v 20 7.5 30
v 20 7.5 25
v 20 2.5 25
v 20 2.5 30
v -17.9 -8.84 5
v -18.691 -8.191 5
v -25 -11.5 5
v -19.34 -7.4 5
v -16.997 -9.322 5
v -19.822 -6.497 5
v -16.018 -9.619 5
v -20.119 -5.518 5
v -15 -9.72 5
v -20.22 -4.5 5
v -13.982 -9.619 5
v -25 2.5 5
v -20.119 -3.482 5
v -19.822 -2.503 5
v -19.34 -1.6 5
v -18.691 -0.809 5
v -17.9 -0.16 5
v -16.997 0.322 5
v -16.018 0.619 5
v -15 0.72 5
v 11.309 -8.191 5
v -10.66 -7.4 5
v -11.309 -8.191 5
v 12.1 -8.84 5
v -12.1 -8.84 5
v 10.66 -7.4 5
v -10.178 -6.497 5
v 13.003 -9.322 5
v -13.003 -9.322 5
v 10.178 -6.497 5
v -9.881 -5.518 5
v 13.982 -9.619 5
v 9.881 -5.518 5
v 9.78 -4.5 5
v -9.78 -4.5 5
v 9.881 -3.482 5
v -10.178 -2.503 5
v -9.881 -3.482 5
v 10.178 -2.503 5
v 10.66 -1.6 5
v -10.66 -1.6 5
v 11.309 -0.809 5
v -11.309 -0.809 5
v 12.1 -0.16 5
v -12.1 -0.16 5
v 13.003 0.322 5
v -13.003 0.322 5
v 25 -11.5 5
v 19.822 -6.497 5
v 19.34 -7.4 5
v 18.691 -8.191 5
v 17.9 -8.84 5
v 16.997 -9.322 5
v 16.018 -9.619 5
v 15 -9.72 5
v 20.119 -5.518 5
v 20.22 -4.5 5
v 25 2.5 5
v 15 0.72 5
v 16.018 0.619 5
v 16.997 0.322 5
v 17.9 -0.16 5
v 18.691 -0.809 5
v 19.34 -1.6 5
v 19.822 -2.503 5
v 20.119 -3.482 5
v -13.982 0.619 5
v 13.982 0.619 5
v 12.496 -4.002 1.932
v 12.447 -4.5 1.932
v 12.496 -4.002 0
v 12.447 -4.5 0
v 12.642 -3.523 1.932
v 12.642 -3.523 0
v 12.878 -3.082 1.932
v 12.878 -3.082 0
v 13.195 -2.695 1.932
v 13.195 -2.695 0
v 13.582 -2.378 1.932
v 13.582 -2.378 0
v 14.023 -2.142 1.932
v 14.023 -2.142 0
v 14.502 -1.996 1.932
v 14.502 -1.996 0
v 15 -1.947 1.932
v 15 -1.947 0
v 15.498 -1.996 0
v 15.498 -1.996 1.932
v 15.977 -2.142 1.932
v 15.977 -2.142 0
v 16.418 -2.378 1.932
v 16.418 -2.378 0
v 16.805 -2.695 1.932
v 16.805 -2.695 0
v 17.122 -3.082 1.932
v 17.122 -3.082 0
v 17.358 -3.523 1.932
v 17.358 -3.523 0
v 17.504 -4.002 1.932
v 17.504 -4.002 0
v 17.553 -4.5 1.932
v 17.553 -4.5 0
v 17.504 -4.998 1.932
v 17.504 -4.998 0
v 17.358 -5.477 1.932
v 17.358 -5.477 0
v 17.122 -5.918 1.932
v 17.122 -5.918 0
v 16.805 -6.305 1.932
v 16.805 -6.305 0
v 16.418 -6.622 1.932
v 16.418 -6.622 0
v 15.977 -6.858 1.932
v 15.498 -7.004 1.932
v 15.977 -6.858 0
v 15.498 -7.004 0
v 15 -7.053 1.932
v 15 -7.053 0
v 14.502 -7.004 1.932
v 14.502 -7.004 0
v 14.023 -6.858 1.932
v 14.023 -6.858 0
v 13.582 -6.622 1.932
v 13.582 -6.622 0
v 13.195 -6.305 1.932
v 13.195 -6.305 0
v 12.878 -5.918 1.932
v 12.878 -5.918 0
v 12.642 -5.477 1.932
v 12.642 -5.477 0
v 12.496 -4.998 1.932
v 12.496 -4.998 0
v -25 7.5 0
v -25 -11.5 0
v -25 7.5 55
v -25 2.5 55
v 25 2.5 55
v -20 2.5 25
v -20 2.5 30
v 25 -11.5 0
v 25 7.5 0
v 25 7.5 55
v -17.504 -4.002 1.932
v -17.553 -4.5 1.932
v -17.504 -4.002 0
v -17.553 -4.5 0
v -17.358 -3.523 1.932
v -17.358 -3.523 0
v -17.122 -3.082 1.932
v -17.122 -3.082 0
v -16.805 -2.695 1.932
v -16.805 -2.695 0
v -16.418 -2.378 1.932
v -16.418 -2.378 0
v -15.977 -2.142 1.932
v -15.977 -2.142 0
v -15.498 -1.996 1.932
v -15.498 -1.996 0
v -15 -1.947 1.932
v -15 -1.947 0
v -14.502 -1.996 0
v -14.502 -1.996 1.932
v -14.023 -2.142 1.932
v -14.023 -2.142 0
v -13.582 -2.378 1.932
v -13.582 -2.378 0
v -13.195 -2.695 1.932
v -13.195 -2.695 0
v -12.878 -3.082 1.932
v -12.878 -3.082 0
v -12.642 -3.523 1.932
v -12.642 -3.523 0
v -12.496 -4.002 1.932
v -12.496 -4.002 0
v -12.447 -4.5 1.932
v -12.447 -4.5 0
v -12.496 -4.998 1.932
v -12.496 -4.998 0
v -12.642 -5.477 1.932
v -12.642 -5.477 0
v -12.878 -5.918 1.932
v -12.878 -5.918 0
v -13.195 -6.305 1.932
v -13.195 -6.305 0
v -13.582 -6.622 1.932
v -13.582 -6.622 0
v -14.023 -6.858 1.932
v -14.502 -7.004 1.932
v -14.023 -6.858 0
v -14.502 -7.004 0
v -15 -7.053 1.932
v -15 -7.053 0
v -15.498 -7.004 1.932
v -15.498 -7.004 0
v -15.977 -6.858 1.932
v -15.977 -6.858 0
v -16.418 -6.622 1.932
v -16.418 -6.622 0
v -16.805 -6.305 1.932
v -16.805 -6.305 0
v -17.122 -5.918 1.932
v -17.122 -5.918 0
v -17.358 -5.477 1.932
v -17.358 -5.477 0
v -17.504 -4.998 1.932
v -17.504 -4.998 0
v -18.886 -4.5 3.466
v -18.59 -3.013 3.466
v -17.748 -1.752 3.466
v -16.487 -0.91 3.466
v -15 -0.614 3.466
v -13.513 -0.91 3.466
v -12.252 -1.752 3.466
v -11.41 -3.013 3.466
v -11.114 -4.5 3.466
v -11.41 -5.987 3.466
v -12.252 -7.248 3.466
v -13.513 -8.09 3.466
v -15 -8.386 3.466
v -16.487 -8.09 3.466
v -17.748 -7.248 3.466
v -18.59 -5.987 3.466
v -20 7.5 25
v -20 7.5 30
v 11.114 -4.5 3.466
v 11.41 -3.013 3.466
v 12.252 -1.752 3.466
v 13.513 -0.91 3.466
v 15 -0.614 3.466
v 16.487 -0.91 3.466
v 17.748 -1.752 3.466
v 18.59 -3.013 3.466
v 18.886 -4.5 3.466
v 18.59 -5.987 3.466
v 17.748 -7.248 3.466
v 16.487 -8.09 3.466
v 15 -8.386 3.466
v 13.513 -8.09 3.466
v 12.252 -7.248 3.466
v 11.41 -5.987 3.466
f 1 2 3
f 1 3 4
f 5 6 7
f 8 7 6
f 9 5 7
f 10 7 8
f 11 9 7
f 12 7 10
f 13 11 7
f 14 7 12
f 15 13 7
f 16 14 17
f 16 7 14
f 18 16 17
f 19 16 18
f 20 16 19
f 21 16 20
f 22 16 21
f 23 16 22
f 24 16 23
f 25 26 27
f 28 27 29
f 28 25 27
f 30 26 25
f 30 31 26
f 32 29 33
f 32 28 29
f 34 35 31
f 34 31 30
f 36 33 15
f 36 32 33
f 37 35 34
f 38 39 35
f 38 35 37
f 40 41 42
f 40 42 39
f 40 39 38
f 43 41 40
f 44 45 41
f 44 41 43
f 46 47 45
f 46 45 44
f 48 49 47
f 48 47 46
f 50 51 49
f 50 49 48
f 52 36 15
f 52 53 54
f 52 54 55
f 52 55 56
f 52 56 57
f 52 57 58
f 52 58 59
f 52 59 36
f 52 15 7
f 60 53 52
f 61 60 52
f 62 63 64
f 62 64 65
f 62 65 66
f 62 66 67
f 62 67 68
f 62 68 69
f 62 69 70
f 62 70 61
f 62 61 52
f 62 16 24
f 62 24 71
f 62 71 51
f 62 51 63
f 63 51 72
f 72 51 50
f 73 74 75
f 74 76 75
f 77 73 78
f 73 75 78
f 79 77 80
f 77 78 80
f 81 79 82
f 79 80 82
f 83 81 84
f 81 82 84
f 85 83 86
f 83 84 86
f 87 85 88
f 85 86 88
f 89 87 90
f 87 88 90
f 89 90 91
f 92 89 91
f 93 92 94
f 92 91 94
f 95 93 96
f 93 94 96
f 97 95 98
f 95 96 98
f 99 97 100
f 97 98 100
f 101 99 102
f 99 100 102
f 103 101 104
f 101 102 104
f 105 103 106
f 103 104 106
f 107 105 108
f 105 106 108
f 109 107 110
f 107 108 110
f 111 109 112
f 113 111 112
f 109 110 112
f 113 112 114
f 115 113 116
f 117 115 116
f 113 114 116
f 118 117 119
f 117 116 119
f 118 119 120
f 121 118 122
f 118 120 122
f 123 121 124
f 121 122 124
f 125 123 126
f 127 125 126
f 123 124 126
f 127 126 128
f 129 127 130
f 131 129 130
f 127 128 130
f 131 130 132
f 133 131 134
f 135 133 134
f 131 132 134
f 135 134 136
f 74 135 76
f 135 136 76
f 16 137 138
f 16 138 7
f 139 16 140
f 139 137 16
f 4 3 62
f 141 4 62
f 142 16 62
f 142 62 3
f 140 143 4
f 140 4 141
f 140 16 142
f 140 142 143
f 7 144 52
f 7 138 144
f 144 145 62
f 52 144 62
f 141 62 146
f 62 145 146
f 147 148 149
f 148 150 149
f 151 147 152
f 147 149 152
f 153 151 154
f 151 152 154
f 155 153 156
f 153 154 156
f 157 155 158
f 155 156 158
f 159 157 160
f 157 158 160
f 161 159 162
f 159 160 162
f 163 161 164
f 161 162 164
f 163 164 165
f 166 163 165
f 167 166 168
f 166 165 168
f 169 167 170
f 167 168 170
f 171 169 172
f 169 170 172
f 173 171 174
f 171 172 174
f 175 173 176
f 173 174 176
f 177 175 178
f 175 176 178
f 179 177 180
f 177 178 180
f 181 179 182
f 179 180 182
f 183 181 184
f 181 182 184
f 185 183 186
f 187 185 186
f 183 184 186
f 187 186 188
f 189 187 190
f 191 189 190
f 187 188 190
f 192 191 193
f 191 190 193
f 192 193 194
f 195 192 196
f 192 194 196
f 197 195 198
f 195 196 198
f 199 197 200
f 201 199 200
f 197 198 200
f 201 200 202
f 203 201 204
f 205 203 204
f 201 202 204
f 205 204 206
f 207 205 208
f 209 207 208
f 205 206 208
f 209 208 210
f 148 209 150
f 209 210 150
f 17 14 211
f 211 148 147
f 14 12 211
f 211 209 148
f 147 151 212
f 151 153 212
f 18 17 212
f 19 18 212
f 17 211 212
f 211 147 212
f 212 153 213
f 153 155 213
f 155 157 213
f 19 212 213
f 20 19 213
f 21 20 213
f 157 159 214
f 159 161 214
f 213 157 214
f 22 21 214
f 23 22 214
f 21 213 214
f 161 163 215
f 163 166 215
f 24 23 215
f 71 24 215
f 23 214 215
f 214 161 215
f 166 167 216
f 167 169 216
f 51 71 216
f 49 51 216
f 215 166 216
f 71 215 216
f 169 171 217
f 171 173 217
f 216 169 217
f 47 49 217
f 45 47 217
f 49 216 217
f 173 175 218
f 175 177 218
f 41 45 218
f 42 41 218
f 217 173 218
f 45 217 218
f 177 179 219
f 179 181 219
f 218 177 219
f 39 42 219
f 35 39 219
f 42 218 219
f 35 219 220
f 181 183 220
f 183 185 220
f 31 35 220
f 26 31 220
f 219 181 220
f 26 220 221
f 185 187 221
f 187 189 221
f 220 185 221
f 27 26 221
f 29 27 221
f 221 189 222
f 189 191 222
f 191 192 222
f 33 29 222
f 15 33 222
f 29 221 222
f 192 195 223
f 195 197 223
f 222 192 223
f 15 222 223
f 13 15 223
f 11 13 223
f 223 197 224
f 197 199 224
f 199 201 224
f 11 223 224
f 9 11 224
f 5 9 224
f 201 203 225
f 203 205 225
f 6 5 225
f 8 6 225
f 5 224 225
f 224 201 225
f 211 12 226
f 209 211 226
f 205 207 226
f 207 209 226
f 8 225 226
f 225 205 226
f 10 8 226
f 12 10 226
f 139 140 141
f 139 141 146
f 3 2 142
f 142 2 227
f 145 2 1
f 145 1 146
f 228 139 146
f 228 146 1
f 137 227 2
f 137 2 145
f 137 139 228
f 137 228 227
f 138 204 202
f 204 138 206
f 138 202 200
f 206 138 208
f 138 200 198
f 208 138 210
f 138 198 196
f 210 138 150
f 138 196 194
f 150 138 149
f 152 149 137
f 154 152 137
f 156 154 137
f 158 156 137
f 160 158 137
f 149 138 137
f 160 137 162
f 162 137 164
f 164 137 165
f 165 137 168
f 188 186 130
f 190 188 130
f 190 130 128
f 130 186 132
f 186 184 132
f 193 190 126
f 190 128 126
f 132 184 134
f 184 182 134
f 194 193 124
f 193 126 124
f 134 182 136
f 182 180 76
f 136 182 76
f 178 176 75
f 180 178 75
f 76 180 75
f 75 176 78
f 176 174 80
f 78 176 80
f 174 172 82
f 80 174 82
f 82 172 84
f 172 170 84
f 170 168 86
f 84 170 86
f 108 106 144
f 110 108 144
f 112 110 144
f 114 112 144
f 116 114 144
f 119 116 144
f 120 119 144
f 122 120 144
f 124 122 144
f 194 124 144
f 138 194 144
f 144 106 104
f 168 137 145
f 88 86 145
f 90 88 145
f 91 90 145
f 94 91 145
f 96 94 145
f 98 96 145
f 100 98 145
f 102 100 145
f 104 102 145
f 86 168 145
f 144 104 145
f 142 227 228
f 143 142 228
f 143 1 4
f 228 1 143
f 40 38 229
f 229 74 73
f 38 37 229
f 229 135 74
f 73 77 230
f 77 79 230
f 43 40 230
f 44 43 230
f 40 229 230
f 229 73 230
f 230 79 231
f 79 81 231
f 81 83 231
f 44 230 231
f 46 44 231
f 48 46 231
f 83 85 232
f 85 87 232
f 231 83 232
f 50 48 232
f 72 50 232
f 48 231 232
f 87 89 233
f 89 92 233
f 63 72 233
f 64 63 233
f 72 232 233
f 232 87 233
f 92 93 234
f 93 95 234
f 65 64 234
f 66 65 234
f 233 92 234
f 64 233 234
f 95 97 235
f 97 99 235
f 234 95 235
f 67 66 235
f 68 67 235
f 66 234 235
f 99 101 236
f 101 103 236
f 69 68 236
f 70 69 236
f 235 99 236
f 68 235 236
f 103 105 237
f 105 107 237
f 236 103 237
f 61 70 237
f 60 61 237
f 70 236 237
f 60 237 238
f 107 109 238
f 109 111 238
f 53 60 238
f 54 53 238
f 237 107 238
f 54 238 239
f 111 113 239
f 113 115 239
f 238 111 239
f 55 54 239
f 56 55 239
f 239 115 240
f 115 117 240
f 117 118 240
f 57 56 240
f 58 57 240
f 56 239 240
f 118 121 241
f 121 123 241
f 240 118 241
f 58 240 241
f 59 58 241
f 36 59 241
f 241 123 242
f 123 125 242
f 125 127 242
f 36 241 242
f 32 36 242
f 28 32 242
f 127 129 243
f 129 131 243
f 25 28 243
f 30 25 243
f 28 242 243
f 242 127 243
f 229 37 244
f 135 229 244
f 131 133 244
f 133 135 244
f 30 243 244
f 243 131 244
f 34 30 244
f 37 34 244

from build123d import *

# Parameters (mm, degrees)
F0_W           = 30
F0_H           = 15
F1_DEPTH       = 5
F2_W           = 30
F2_H           = 5
F3_DEPTH       = 50
F4_DEPTH       = 10
F5_DEPTH       = 10
F6_DEPTH       = 4
F8_D           = 5.1054
F8_DEPTH       = 10
F8_CSINK_D     = 10.4394
F8_CSINK_ANGLE = 82
F8_TIP         = 1.5338169022
F9_W           = 40
F9_H           = 5
F10_DEPTH      = 19.001


with BuildPart() as f1:
    # F0 (on Top) → F1 (new body)
    with BuildSketch(Plane.XY):
        Rectangle(F0_W, F0_H)
    extrude(amount=F1_DEPTH)

    # F2 (on face) → F3 (join)
    with BuildSketch(Plane.XY.offset(5)):
        with Locations((0, 5)):
            Rectangle(F2_W, F2_H)
    extrude(amount=F3_DEPTH)

    # F4 (add): a face of the model
    f4_faces = [f1.faces().sort_by_distance(p)[0] for p in [
        (-15, 3.8461538462, 23.6538461538),
    ]]
    extrude(f4_faces, amount=F4_DEPTH)

    # F5 (add): a face of the model
    f5_faces = [f1.faces().sort_by_distance(p)[0] for p in [
        (15, 3.8461538462, 23.6538461538),
    ]]
    extrude(f5_faces, amount=F5_DEPTH)

    # F6 (add): a face of the model
    f6_faces = [f1.faces().sort_by_distance(p)[0] for p in [
        (0, -7.5, 2.5),
    ]]
    extrude(f6_faces, amount=F6_DEPTH)

    # F8
    with Locations(Plane.XY.offset(5)):
        with Locations((15, -4.5), (-15, -4.5)):
            CounterSinkHole(F8_D / 2, F8_CSINK_D / 2, depth=F8_DEPTH, counter_sink_angle=F8_CSINK_ANGLE)
            with Locations((0, 0, -(F8_DEPTH + F8_TIP / 2))):  # 118° drill point
                Cone(0, F8_D / 2, F8_TIP, mode=Mode.SUBTRACT)

    # F9 (on face) → F10 (cut, through all)
    with BuildSketch(Plane(origin=(0, 7.5, 0), x_dir=(-1, 0, 0), z_dir=(0, 1, 0))):
        with Locations((0, 27.5)):
            Rectangle(F9_W, F9_H)
    extrude(amount=-F10_DEPTH, mode=Mode.SUBTRACT)


solid = f1.part
